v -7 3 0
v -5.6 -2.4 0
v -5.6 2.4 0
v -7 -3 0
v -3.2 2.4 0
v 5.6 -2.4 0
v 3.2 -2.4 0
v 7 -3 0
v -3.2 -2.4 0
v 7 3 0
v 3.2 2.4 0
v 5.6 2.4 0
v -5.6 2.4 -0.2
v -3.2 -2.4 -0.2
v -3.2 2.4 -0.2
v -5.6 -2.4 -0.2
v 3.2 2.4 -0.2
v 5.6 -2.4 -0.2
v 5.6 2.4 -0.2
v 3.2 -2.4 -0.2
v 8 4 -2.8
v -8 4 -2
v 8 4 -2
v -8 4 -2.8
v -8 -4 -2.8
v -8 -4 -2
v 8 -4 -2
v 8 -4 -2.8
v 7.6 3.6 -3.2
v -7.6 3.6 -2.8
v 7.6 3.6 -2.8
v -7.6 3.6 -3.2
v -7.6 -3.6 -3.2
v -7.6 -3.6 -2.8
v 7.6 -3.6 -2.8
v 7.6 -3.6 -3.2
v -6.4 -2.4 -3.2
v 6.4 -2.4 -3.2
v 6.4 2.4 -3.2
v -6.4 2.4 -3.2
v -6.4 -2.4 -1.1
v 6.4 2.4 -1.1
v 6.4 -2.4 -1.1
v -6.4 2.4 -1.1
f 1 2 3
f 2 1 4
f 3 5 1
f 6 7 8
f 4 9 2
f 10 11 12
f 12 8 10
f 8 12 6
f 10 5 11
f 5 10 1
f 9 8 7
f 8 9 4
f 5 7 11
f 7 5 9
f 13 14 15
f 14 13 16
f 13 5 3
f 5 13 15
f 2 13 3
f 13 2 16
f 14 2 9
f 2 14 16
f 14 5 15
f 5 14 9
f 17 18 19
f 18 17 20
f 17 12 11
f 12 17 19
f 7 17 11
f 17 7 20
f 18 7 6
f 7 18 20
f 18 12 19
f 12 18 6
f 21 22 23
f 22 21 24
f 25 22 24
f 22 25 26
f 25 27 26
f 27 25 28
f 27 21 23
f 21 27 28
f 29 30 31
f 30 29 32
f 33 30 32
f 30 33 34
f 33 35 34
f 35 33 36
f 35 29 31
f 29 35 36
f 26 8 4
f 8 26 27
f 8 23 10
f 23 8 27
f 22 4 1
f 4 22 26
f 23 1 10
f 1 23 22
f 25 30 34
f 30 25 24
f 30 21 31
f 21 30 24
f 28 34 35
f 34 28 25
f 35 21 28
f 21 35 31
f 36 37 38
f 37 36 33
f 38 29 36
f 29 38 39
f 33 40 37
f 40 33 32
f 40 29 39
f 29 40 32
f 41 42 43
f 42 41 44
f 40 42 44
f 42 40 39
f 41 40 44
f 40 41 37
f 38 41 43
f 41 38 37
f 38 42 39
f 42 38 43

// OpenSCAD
// file: ../p/4-4edge.scad
use <../lib.scad>
$fa=1; $fs=0.2;
function ldraw_lib__4_4edge(realsolid=false) = [
// 0 Circle 1.0
// 0 Name: 4-4edge.dat
// 0 Author: James Jessiman
// 0 !LDRAW_ORG Primitive UPDATE 2017-01
// 0 !LICENSE Licensed under CC BY 2.0 and CC BY 4.0 : see CAreadme.txt
// 
// 0 BFC CERTIFY CCW
  [0,"BFC","CERTIFY"],
  [0,"BFC","CCW"],
// 
// 0 !HISTORY 1998-12-15 [PTadmin] Official Update 1998-10
// 0 !HISTORY 2005-12-28 [PTadmin] Official Update 2005-01
// 0 !HISTORY 2007-06-24 [PTadmin] Header formatted for Contributor Agreement
// 0 !HISTORY 2008-07-01 [PTadmin] Official Update 2008-01
// 0 !HISTORY 2017-01-15 [Steffen] BFCed
// 0 !HISTORY 2017-12-30 [PTadmin] Official Update 2017-01
// 
// 
// 2 24 1 0 0 0.9239 0 0.3827
  [2,24,1,0,0,0.9239,0,0.3827],
// 2 24 0.9239 0 0.3827 0.7071 0 0.7071
  [2,24,0.9239,0,0.3827,0.7071,0,0.7071],
// 2 24 0.7071 0 0.7071 0.3827 0 0.9239
  [2,24,0.7071,0,0.7071,0.3827,0,0.9239],
// 2 24 0.3827 0 0.9239 0 0 1
  [2,24,0.3827,0,0.9239,0,0,1],
// 2 24 0 0 1 -0.3827 0 0.9239
  [2,24,0,0,1,-0.3827,0,0.9239],
// 2 24 -0.3827 0 0.9239 -0.7071 0 0.7071
  [2,24,-0.3827,0,0.9239,-0.7071,0,0.7071],
// 2 24 -0.7071 0 0.7071 -0.9239 0 0.3827
  [2,24,-0.7071,0,0.7071,-0.9239,0,0.3827],
// 2 24 -0.9239 0 0.3827 -1 0 -0
  [2,24,-0.9239,0,0.3827,-1,0,-0],
// 2 24 -1 0 -0 -0.9239 0 -0.3827
  [2,24,-1,0,-0,-0.9239,0,-0.3827],
// 2 24 -0.9239 0 -0.3827 -0.7071 0 -0.7071
  [2,24,-0.9239,0,-0.3827,-0.7071,0,-0.7071],
// 2 24 -0.7071 0 -0.7071 -0.3827 0 -0.9239
  [2,24,-0.7071,0,-0.7071,-0.3827,0,-0.9239],
// 2 24 -0.3827 0 -0.9239 0 0 -1
  [2,24,-0.3827,0,-0.9239,0,0,-1],
// 2 24 0 0 -1 0.3827 0 -0.9239
  [2,24,0,0,-1,0.3827,0,-0.9239],
// 2 24 0.3827 0 -0.9239 0.7071 0 -0.7071
  [2,24,0.3827,0,-0.9239,0.7071,0,-0.7071],
// 2 24 0.7071 0 -0.7071 0.9239 0 -0.3827
  [2,24,0.7071,0,-0.7071,0.9239,0,-0.3827],
// 2 24 0.9239 0 -0.3827 1 0 0
  [2,24,0.9239,0,-0.3827,1,0,0],
];
module ldraw_lib__4_4edge(step=0, col=false, unit=2/5, alt=false, line=0.2, solid=!$preview)
    makepoly(ldraw_lib__4_4edge(solid), step=step, col=col, unit=unit, alt=alt, line=line, solid=solid);
ldraw_lib__4_4edge(line=0.2);
// file: ../p/4-4disc.scad
use <../lib.scad>
$fa=1; $fs=0.2;
function ldraw_lib__4_4disc(realsolid=false) = [
// 0 Disc 1.0
// 0 Name: 4-4disc.dat
// 0 Author: James Jessiman
// 0 !LDRAW_ORG Primitive UPDATE 2002-02
// 0 !LICENSE Licensed under CC BY 2.0 and CC BY 4.0 : see CAreadme.txt
// 
// 0 BFC CERTIFY CCW
  [0,"BFC","CERTIFY"],
  [0,"BFC","CCW"],
// 
// 0 !HISTORY 1998-12-15 [PTadmin] Official Update 1998-10
// 0 !HISTORY 2002-03-23 [sbliss] Added BFC statement
// 0 !HISTORY 2002-04-25 [PTadmin] Official Update 2002-02
// 0 !HISTORY 2007-06-24 [PTadmin] Header formatted for Contributor Agreement
// 0 !HISTORY 2008-07-01 [PTadmin] Official Update 2008-01
// 
// 
// 3 16 0 0 0 1 0 0 0.9239 0 0.3827
  [3,16,0,0,0,1,0,0,0.9239,0,0.3827],
// 3 16 0 0 0 0.9239 0 0.3827 0.7071 0 0.7071
  [3,16,0,0,0,0.9239,0,0.3827,0.7071,0,0.7071],
// 3 16 0 0 0 0.7071 0 0.7071 0.3827 0 0.9239
  [3,16,0,0,0,0.7071,0,0.7071,0.3827,0,0.9239],
// 3 16 0 0 0 0.3827 0 0.9239 0 0 1
  [3,16,0,0,0,0.3827,0,0.9239,0,0,1],
// 3 16 0 0 0 0 0 1 -0.3827 0 0.9239
  [3,16,0,0,0,0,0,1,-0.3827,0,0.9239],
// 3 16 0 0 0 -0.3827 0 0.9239 -0.7071 0 0.7071
  [3,16,0,0,0,-0.3827,0,0.9239,-0.7071,0,0.7071],
// 3 16 0 0 0 -0.7071 0 0.7071 -0.9239 0 0.3827
  [3,16,0,0,0,-0.7071,0,0.7071,-0.9239,0,0.3827],
// 3 16 0 0 0 -0.9239 0 0.3827 -1 0 -0
  [3,16,0,0,0,-0.9239,0,0.3827,-1,0,-0],
// 3 16 0 0 0 -1 0 -0 -0.9239 0 -0.3827
  [3,16,0,0,0,-1,0,-0,-0.9239,0,-0.3827],
// 3 16 0 0 0 -0.9239 0 -0.3827 -0.7071 0 -0.7071
  [3,16,0,0,0,-0.9239,0,-0.3827,-0.7071,0,-0.7071],
// 3 16 0 0 0 -0.7071 0 -0.7071 -0.3827 0 -0.9239
  [3,16,0,0,0,-0.7071,0,-0.7071,-0.3827,0,-0.9239],
// 3 16 0 0 0 -0.3827 0 -0.9239 0 0 -1
  [3,16,0,0,0,-0.3827,0,-0.9239,0,0,-1],
// 3 16 0 0 0 0 0 -1 0.3827 0 -0.9239
  [3,16,0,0,0,0,0,-1,0.3827,0,-0.9239],
// 3 16 0 0 0 0.3827 0 -0.9239 0.7071 0 -0.7071
  [3,16,0,0,0,0.3827,0,-0.9239,0.7071,0,-0.7071],
// 3 16 0 0 0 0.7071 0 -0.7071 0.9239 0 -0.3827
  [3,16,0,0,0,0.7071,0,-0.7071,0.9239,0,-0.3827],
// 3 16 0 0 0 0.9239 0 -0.3827 1 0 0
  [3,16,0,0,0,0.9239,0,-0.3827,1,0,0],
// 0
];
module ldraw_lib__4_4disc(step=0, col=false, unit=2/5, alt=false, line=0.2, solid=!$preview)
    makepoly(ldraw_lib__4_4disc(solid), step=step, col=col, unit=unit, alt=alt, line=line, solid=solid);
ldraw_lib__4_4disc(line=0.2);
// file: ../p/4-4cyli.scad
use <../lib.scad>
$fa=1; $fs=0.2;
function ldraw_lib__4_4cyli(realsolid=false) = [
// 0 Cylinder 1.0
// 0 Name: 4-4cyli.dat
// 0 Author: James Jessiman
// 0 !LDRAW_ORG Primitive UPDATE 2005-01
// 0 !LICENSE Licensed under CC BY 2.0 and CC BY 4.0 : see CAreadme.txt
// 
// 0 BFC CERTIFY CCW
  [0,"BFC","CERTIFY"],
  [0,"BFC","CCW"],
// 
// 0 !HISTORY 1998-12-15 [PTadmin] Official Update 1998-10
// 0 !HISTORY 2002-03-23 [sbliss] Added BFC statement; merged headers from files in distributions LDraw 0.27 and Complete.
// 0 !HISTORY 2002-04-25 [PTadmin] Official Update 2002-02
// 0 !HISTORY 2004-12-14 [guyvivan] BFC CCW
// 0 !HISTORY 2005-12-28 [PTadmin] Official Update 2005-01
// 0 !HISTORY 2007-06-24 [PTadmin] Header formatted for Contributor Agreement
// 0 !HISTORY 2008-07-01 [PTadmin] Official Update 2008-01
// 
// 
// 4 16 1 1 0 0.9239 1 0.3827 0.9239 0 0.3827 1 0 0
  [4,16,1,1,0,0.9239,1,0.3827,0.9239,0,0.3827,1,0,0],
// 5 24 1 0 0 1 1 0 0.9239 0 0.3827 0.9239 0 -0.3827
  [5,24,1,0,0,1,1,0,0.9239,0,0.3827,0.9239,0,-0.3827],
// 4 16 0.9239 1 0.3827 0.7071 1 0.7071 0.7071 0 0.7071 0.9239 0 0.3827
  [4,16,0.9239,1,0.3827,0.7071,1,0.7071,0.7071,0,0.7071,0.9239,0,0.3827],
// 5 24 0.9239 0 0.3827 0.9239 1 0.3827 0.7071 0 0.7071 1 0 0
  [5,24,0.9239,0,0.3827,0.9239,1,0.3827,0.7071,0,0.7071,1,0,0],
// 4 16 0.7071 1 0.7071 0.3827 1 0.9239 0.3827 0 0.9239 0.7071 0 0.7071
  [4,16,0.7071,1,0.7071,0.3827,1,0.9239,0.3827,0,0.9239,0.7071,0,0.7071],
// 5 24 0.7071 0 0.7071 0.7071 1 0.7071 0.3827 0 0.9239 0.9239 0 0.3827
  [5,24,0.7071,0,0.7071,0.7071,1,0.7071,0.3827,0,0.9239,0.9239,0,0.3827],
// 4 16 0.3827 1 0.9239 0 1 1 0 0 1 0.3827 0 0.9239
  [4,16,0.3827,1,0.9239,0,1,1,0,0,1,0.3827,0,0.9239],
// 5 24 0.3827 0 0.9239 0.3827 1 0.9239 0 0 1 0.7071 0 0.7071
  [5,24,0.3827,0,0.9239,0.3827,1,0.9239,0,0,1,0.7071,0,0.7071],
// 4 16 0 1 1 -0.3827 1 0.9239 -0.3827 0 0.9239 0 0 1
  [4,16,0,1,1,-0.3827,1,0.9239,-0.3827,0,0.9239,0,0,1],
// 5 24 0 0 1 0 1 1 -0.3827 0 0.9239 0.3827 0 0.9239
  [5,24,0,0,1,0,1,1,-0.3827,0,0.9239,0.3827,0,0.9239],
// 4 16 -0.3827 1 0.9239 -0.7071 1 0.7071 -0.7071 0 0.7071 -0.3827 0 0.9239
  [4,16,-0.3827,1,0.9239,-0.7071,1,0.7071,-0.7071,0,0.7071,-0.3827,0,0.9239],
// 5 24 -0.3827 0 0.9239 -0.3827 1 0.9239 -0.7071 0 0.7071 0 0 1
  [5,24,-0.3827,0,0.9239,-0.3827,1,0.9239,-0.7071,0,0.7071,0,0,1],
// 4 16 -0.7071 1 0.7071 -0.9239 1 0.3827 -0.9239 0 0.3827 -0.7071 0 0.7071
  [4,16,-0.7071,1,0.7071,-0.9239,1,0.3827,-0.9239,0,0.3827,-0.7071,0,0.7071],
// 5 24 -0.7071 0 0.7071 -0.7071 1 0.7071 -0.9239 0 0.3827 -0.3827 0 0.9239
  [5,24,-0.7071,0,0.7071,-0.7071,1,0.7071,-0.9239,0,0.3827,-0.3827,0,0.9239],
// 4 16 -0.9239 1 0.3827 -1 1 0 -1 0 0 -0.9239 0 0.3827
  [4,16,-0.9239,1,0.3827,-1,1,0,-1,0,0,-0.9239,0,0.3827],
// 5 24 -0.9239 0 0.3827 -0.9239 1 0.3827 -1 0 0 -0.7071 0 0.7071
  [5,24,-0.9239,0,0.3827,-0.9239,1,0.3827,-1,0,0,-0.7071,0,0.7071],
// 4 16 -1 1 0 -0.9239 1 -0.3827 -0.9239 0 -0.3827 -1 0 0
  [4,16,-1,1,0,-0.9239,1,-0.3827,-0.9239,0,-0.3827,-1,0,0],
// 5 24 -1 0 0 -1 1 0 -0.9239 0 -0.3827 -0.9239 0 0.3827
  [5,24,-1,0,0,-1,1,0,-0.9239,0,-0.3827,-0.9239,0,0.3827],
// 4 16 -0.9239 1 -0.3827 -0.7071 1 -0.7071 -0.7071 0 -0.7071 -0.9239 0 -0.3827
  [4,16,-0.9239,1,-0.3827,-0.7071,1,-0.7071,-0.7071,0,-0.7071,-0.9239,0,-0.3827],
// 5 24 -0.9239 0 -0.3827 -0.9239 1 -0.3827 -0.7071 0 -0.7071 -1 0 0
  [5,24,-0.9239,0,-0.3827,-0.9239,1,-0.3827,-0.7071,0,-0.7071,-1,0,0],
// 4 16 -0.7071 1 -0.7071 -0.3827 1 -0.9239 -0.3827 0 -0.9239 -0.7071 0 -0.7071
  [4,16,-0.7071,1,-0.7071,-0.3827,1,-0.9239,-0.3827,0,-0.9239,-0.7071,0,-0.7071],
// 5 24 -0.7071 0 -0.7071 -0.7071 1 -0.7071 -0.3827 0 -0.9239 -0.9239 0 -0.3827
  [5,24,-0.7071,0,-0.7071,-0.7071,1,-0.7071,-0.3827,0,-0.9239,-0.9239,0,-0.3827],
// 4 16 -0.3827 1 -0.9239 0 1 -1 0 0 -1 -0.3827 0 -0.9239
  [4,16,-0.3827,1,-0.9239,0,1,-1,0,0,-1,-0.3827,0,-0.9239],
// 5 24 -0.3827 0 -0.9239 -0.3827 1 -0.9239 0 0 -1 -0.7071 0 -0.7071
  [5,24,-0.3827,0,-0.9239,-0.3827,1,-0.9239,0,0,-1,-0.7071,0,-0.7071],
// 4 16 0 1 -1 0.3827 1 -0.9239 0.3827 0 -0.9239 0 0 -1
  [4,16,0,1,-1,0.3827,1,-0.9239,0.3827,0,-0.9239,0,0,-1],
// 5 24 0 0 -1 0 1 -1 0.3827 0 -0.9239 -0.3827 0 -0.9239
  [5,24,0,0,-1,0,1,-1,0.3827,0,-0.9239,-0.3827,0,-0.9239],
// 4 16 0.3827 1 -0.9239 0.7071 1 -0.7071 0.7071 0 -0.7071 0.3827 0 -0.9239
  [4,16,0.3827,1,-0.9239,0.7071,1,-0.7071,0.7071,0,-0.7071,0.3827,0,-0.9239],
// 5 24 0.3827 0 -0.9239 0.3827 1 -0.9239 0.7071 0 -0.7071 0 0 -1
  [5,24,0.3827,0,-0.9239,0.3827,1,-0.9239,0.7071,0,-0.7071,0,0,-1],
// 4 16 0.7071 1 -0.7071 0.9239 1 -0.3827 0.9239 0 -0.3827 0.7071 0 -0.7071
  [4,16,0.7071,1,-0.7071,0.9239,1,-0.3827,0.9239,0,-0.3827,0.7071,0,-0.7071],
// 5 24 0.7071 0 -0.7071 0.7071 1 -0.7071 0.9239 0 -0.3827 0.3827 0 -0.9239
  [5,24,0.7071,0,-0.7071,0.7071,1,-0.7071,0.9239,0,-0.3827,0.3827,0,-0.9239],
// 4 16 0.9239 1 -0.3827 1 1 0 1 0 0 0.9239 0 -0.3827
  [4,16,0.9239,1,-0.3827,1,1,0,1,0,0,0.9239,0,-0.3827],
// 5 24 0.9239 0 -0.3827 0.9239 1 -0.3827 1 0 0 0.7071 0 -0.7071
  [5,24,0.9239,0,-0.3827,0.9239,1,-0.3827,1,0,0,0.7071,0,-0.7071],
// 0
];
module ldraw_lib__4_4cyli(step=0, col=false, unit=2/5, alt=false, line=0.2, solid=!$preview)
    makepoly(ldraw_lib__4_4cyli(solid), step=step, col=col, unit=unit, alt=alt, line=line, solid=solid);
ldraw_lib__4_4cyli(line=0.2);
// file: ../p/stud3.scad
use <../lib.scad>
use <4-4cyli.scad>
use <4-4disc.scad>
use <4-4edge.scad>
$fa=1; $fs=0.2;
function ldraw_lib__stud3(realsolid=false) = realsolid ? 
    [openscad(translate([0,0,-eps()], o=cylinder(4+eps(), r=4)),2)] : [
// 0 Stud Tube Solid
// 0 Name: stud3.dat
// 0 Author: James Jessiman
// 0 !LDRAW_ORG Primitive UPDATE 2012-01
// 0 !LICENSE Licensed under CC BY 2.0 and CC BY 4.0 : see CAreadme.txt
// 
// 0 BFC CERTIFY CCW
  [0,"BFC","CERTIFY"],
  [0,"BFC","CCW"],
// 
// 0 !HISTORY 2002-04-04 [sbliss] Modified for BFC compliance
// 0 !HISTORY 2002-04-25 [PTadmin] Official Update 2002-02
// 0 !HISTORY 2007-06-24 [PTadmin] Header formatted for Contributor Agreement
// 0 !HISTORY 2008-07-01 [PTadmin] Official Update 2008-01
// 0 !HISTORY 2012-02-16 [Philo] Changed to CCW
// 0 !HISTORY 2012-03-30 [PTadmin] Official Update 2012-01
// 
// 
// 1 16 0 -4 0 4 0 0 0 1 0 0 0 4 4-4edge.dat
  [1,16,0,-4,0,4,0,0,0,1,0,0,0,4, ldraw_lib__4_4edge(realsolid)],
// 1 16 0 0 0 4 0 0 0 1 0 0 0 4 4-4edge.dat
  [1,16,0,0,0,4,0,0,0,1,0,0,0,4, ldraw_lib__4_4edge(realsolid)],
// 1 16 0 -4 0 4 0 0 0 1 0 0 0 4 4-4disc.dat
  [1,16,0,-4,0,4,0,0,0,1,0,0,0,4, ldraw_lib__4_4disc(realsolid)],
// 1 16 0 -4 0 4 0 0 0 4 0 0 0 4 4-4cyli.dat
  [1,16,0,-4,0,4,0,0,0,4,0,0,0,4, ldraw_lib__4_4cyli(realsolid)],
];
module ldraw_lib__stud3(step=0, col=false, unit=2/5, alt=false, line=0.2, solid=!$preview)
    makepoly(ldraw_lib__stud3(solid), step=step, col=col, unit=unit, alt=alt, line=line, solid=solid);
ldraw_lib__stud3(line=0.2);
// file: ../p/stud.scad
use <../lib.scad>
use <4-4cyli.scad>
use <4-4disc.scad>
use <4-4edge.scad>
$fa=1; $fs=0.2;
function ldraw_lib__stud(realsolid=false) = realsolid ? 
    [openscad(translate([0,0,-eps()], o=cylinder(4+eps(), r=6)),2)] : [
// 0 Stud
// 0 Name: stud.dat
// 0 Author: James Jessiman
// 0 !LDRAW_ORG Primitive UPDATE 2012-01
// 0 !LICENSE Licensed under CC BY 2.0 and CC BY 4.0 : see CAreadme.txt
// 
// 0 BFC CERTIFY CCW
  [0,"BFC","CERTIFY"],
  [0,"BFC","CCW"],
// 
// 0 !HISTORY 2002-04-04 [sbliss] Modified for BFC compliance
// 0 !HISTORY 2002-04-25 [PTadmin] Official Update 2002-02
// 0 !HISTORY 2007-06-24 [PTadmin] Header formatted for Contributor Agreement
// 0 !HISTORY 2008-07-01 [PTadmin] Official Update 2008-01
// 0 !HISTORY 2012-02-16 [Philo] Changed to CCW
// 0 !HISTORY 2012-03-30 [PTadmin] Official Update 2012-01
// 
// 
// 1 16 0 0 0 6 0 0 0 1 0 0 0 6 4-4edge.dat
  [1,16,0,0,0,6,0,0,0,1,0,0,0,6, ldraw_lib__4_4edge(realsolid)],
// 1 16 0 -4 0 6 0 0 0 1 0 0 0 6 4-4edge.dat
  [1,16,0,-4,0,6,0,0,0,1,0,0,0,6, ldraw_lib__4_4edge(realsolid)],
// 1 16 0 0 0 6 0 0 0 -4 0 0 0 6 4-4cyli.dat
  [1,16,0,0,0,6,0,0,0,-4,0,0,0,6, ldraw_lib__4_4cyli(realsolid)],
// 1 16 0 -4 0 6 0 0 0 1 0 0 0 6 4-4disc.dat
  [1,16,0,-4,0,6,0,0,0,1,0,0,0,6, ldraw_lib__4_4disc(realsolid)],
];
module ldraw_lib__stud(step=0, col=false, unit=2/5, alt=false, line=0.2, solid=!$preview)
    makepoly(ldraw_lib__stud(solid), step=step, col=col, unit=unit, alt=alt, line=line, solid=solid);
ldraw_lib__stud(line=0.2);
// file: ../p/box4t.scad
use <../lib.scad>
$fa=1; $fs=0.2;
function ldraw_lib__box4t(realsolid=false) = [
// 0 Box with 4 Adjacent Faces and All Edges
// 0 Name: box4t.dat
// 0 Author: Tore Eriksson [Tore_Eriksson]
// 0 !LDRAW_ORG Primitive UPDATE 2003-02
// 0 !LICENSE Licensed under CC BY 2.0 and CC BY 4.0 : see CAreadme.txt
// 
// 0 BFC CERTIFY CCW
  [0,"BFC","CERTIFY"],
  [0,"BFC","CCW"],
// 
// 0 !HISTORY 1997-09-29 [PTadmin] Official Update 1997-15
// 0 !HISTORY 2002-08-31 [izanette] Modified with WINDZ for BFC compliance
// 0 !HISTORY 2003-08-01 [PTadmin] Official Update 2003-02
// 0 !HISTORY 2007-06-24 [PTadmin] Header formatted for Contributor Agreement
// 0 !HISTORY 2008-07-01 [PTadmin] Official Update 2008-01
// 
// 
// 2 24 1 1 1 -1 1 1
  [2,24,1,1,1,-1,1,1],
// 2 24 -1 1 1 -1 1 -1
  [2,24,-1,1,1,-1,1,-1],
// 2 24 -1 1 -1 1 1 -1
  [2,24,-1,1,-1,1,1,-1],
// 2 24 1 1 -1 1 1 1
  [2,24,1,1,-1,1,1,1],
// 2 24 1 0 1 -1 0 1
  [2,24,1,0,1,-1,0,1],
// 2 24 -1 0 1 -1 0 -1
  [2,24,-1,0,1,-1,0,-1],
// 2 24 -1 0 -1 1 0 -1
  [2,24,-1,0,-1,1,0,-1],
// 2 24 1 0 -1 1 0 1
  [2,24,1,0,-1,1,0,1],
// 2 24 1 0 1 1 1 1
  [2,24,1,0,1,1,1,1],
// 2 24 -1 0 1 -1 1 1
  [2,24,-1,0,1,-1,1,1],
// 2 24 1 0 -1 1 1 -1
  [2,24,1,0,-1,1,1,-1],
// 2 24 -1 0 -1 -1 1 -1
  [2,24,-1,0,-1,-1,1,-1],
// 4 16 1 1 1 1 1 -1 -1 1 -1 -1 1 1
  [4,16,1,1,1,1,1,-1,-1,1,-1,-1,1,1],
// 4 16 1 1 1 -1 1 1 -1 0 1 1 0 1
  [4,16,1,1,1,-1,1,1,-1,0,1,1,0,1],
// 4 16 -1 1 1 -1 1 -1 -1 0 -1 -1 0 1
  [4,16,-1,1,1,-1,1,-1,-1,0,-1,-1,0,1],
// 0 4 16 -1 1 -1 -1 0 -1 1 0 -1 1 1 -1
// 4 16 1 1 -1 1 1 1 1 0 1 1 0 -1
  [4,16,1,1,-1,1,1,1,1,0,1,1,0,-1],
// 0
];
module ldraw_lib__box4t(step=0, col=false, unit=2/5, alt=false, line=0.2, solid=!$preview)
    makepoly(ldraw_lib__box4t(solid), step=step, col=col, unit=unit, alt=alt, line=line, solid=solid);
ldraw_lib__box4t(line=0.2);
// file: s/3004s01.scad
use <../../lib.scad>
use <../../p/box4t.scad>
use <../../p/box5.scad>
use <../../p/stud.scad>
use <../../p/stud3.scad>
$fa=1; $fs=0.2;
function ldraw_lib__s__3004s01(realsolid=false) = [
// 0 ~Brick  1 x  2 without Front Face
// 0 Name: s\3004s01.dat
// 0 Author: James Jessiman
// 0 !LDRAW_ORG Subpart UPDATE 2003-03
// 0 !LICENSE Licensed under CC BY 2.0 and CC BY 4.0 : see CAreadme.txt
// 
// 0 BFC CERTIFY CCW
  [0,"BFC","CERTIFY"],
  [0,"BFC","CCW"],
// 
// 0 !HISTORY 2003-09-07 [jriley] Subfiling, BFC
// 0 !HISTORY 2003-12-19 [PTadmin] Official Update 2003-03
// 0 !HISTORY 2007-08-29 [PTadmin] Header formatted for Contributor Agreement
// 0 !HISTORY 2008-07-01 [PTadmin] Official Update 2008-01
// 
// 
// 1 16 0 4 0 1 0 0 0 -5 0 0 0 1 stud3.dat
  [1,16,0,4,0,1,0,0,0,-5,0,0,0,1, ldraw_lib__stud3(realsolid)],
// 0 BFC INVERTNEXT
  [0,"BFC","INVERTNEXT"],
// 1 16 0 24 0 16 0 0 0 -20 0 0 0 6 box5.dat
  [1,16,0,24,0,16,0,0,0,-20,0,0,0,6, ldraw_lib__box5(realsolid)],
// 4 16 20 24 10 16 24 6 -16 24 6 -20 24 10
  [4,16,20,24,10,16,24,6,-16,24,6,-20,24,10],
// 4 16 -20 24 10 -16 24 6 -16 24 -6 -20 24 -10
  [4,16,-20,24,10,-16,24,6,-16,24,-6,-20,24,-10],
// 4 16 -20 24 -10 -16 24 -6 16 24 -6 20 24 -10
  [4,16,-20,24,-10,-16,24,-6,16,24,-6,20,24,-10],
// 4 16 20 24 -10 16 24 -6 16 24 6 20 24 10
  [4,16,20,24,-10,16,24,-6,16,24,6,20,24,10],
// 1 16 0 24 0 20 0 0 0 -24 0 0 0 10 box4t.dat
  [1,16,0,24,0,20,0,0,0,-24,0,0,0,10, ldraw_lib__box4t(realsolid)],
// 1 16 10 0 0 1 0 0 0 1 0 0 0 1 stud.dat
  [1,16,10,0,0,1,0,0,0,1,0,0,0,1, ldraw_lib__stud(realsolid)],
// 1 16 -10 0 0 1 0 0 0 1 0 0 0 1 stud.dat
  [1,16,-10,0,0,1,0,0,0,1,0,0,0,1, ldraw_lib__stud(realsolid)],
// 0
];
module ldraw_lib__s__3004s01(step=0, col=false, unit=2/5, alt=false, line=0.2, solid=!$preview)
    makepoly(ldraw_lib__s__3004s01(solid), step=step, col=col, unit=unit, alt=alt, line=line, solid=solid);
ldraw_lib__s__3004s01(line=0.2);
// file: 3004.scad
use <../lib.scad>
use <s/3004s01.scad>
$fa=1; $fs=0.2;
function ldraw_lib__3004(realsolid=false) = [
// 0 Brick  1 x  2
// 0 Name: 3004.dat
// 0 Author: James Jessiman
// 0 !LDRAW_ORG Part UPDATE 2022-05
// 0 !LICENSE Licensed under CC BY 2.0 and CC BY 4.0 : see CAreadme.txt
// 
// 0 BFC CERTIFY CCW
  [0,"BFC","CERTIFY"],
  [0,"BFC","CCW"],
// 
// 0 !HISTORY 2001-10-26 [PTadmin] Official Update 2001-01
// 0 !HISTORY 2002-05-07 {unknown} BFC Certification
// 0 !HISTORY 2002-06-11 [PTadmin] Official Update 2002-03
// 0 !HISTORY 2007-05-07 [PTadmin] Header formatted for Contributor Agreement
// 0 !HISTORY 2008-07-01 [PTadmin] Official Update 2008-01
// 0 !HISTORY 2022-08-04 [MagFors] Using subfile
// 0 !HISTORY 2022-09-15 [PTadmin] Official Update 2022-05
// 
// 
// 1 16 0 0 0 1 0 0 0 1 0 0 0 1 s\3004s01.dat
  [1,16,0,0,0,1,0,0,0,1,0,0,0,1, ldraw_lib__s__3004s01(realsolid)],
// 4 16 -20 24 -10 20 24 -10 20 0 -10 -20 0 -10
  [4,16,-20,24,-10,20,24,-10,20,0,-10,-20,0,-10],
];
module ldraw_lib__3004(step=0, col=false, unit=2/5, alt=false, line=0.2, solid=!$preview)
    makepoly(ldraw_lib__3004(solid), step=step, col=col, unit=unit, alt=alt, line=line, solid=solid);
ldraw_lib__3004(line=0.2);
// file: ../p/box5.scad
use <../lib.scad>
$fa=1; $fs=0.2;
function ldraw_lib__box5(realsolid=false) = [
// 0 Box with 5 Faces and All Edges
// 0 Name: box5.dat
// 0 Author: James Jessiman
// 0 !LDRAW_ORG Primitive UPDATE 2012-01
// 0 !LICENSE Licensed under CC BY 2.0 and CC BY 4.0 : see CAreadme.txt
// 
// 0 BFC CERTIFY CCW
  [0,"BFC","CERTIFY"],
  [0,"BFC","CCW"],
// 
// 0 !HISTORY 2002-04-03 [sbliss] Modified for BFC compliance
// 0 !HISTORY 2002-04-25 [PTadmin] Official Update 2002-02
// 0 !HISTORY 2007-06-24 [PTadmin] Header formatted for Contributor Agreement
// 0 !HISTORY 2008-07-01 [PTadmin] Official Update 2008-01
// 0 !HISTORY 2012-02-16 [Philo] Changed to CCW
// 0 !HISTORY 2012-03-30 [PTadmin] Official Update 2012-01
// 
// 
// 2 24 1 1 1 -1 1 1
  [2,24,1,1,1,-1,1,1],
// 2 24 -1 1 1 -1 1 -1
  [2,24,-1,1,1,-1,1,-1],
// 2 24 -1 1 -1 1 1 -1
  [2,24,-1,1,-1,1,1,-1],
// 2 24 1 1 -1 1 1 1
  [2,24,1,1,-1,1,1,1],
// 2 24 1 0 1 -1 0 1
  [2,24,1,0,1,-1,0,1],
// 2 24 -1 0 1 -1 0 -1
  [2,24,-1,0,1,-1,0,-1],
// 2 24 -1 0 -1 1 0 -1
  [2,24,-1,0,-1,1,0,-1],
// 2 24 1 0 -1 1 0 1
  [2,24,1,0,-1,1,0,1],
// 2 24 1 0 1 1 1 1
  [2,24,1,0,1,1,1,1],
// 2 24 -1 0 1 -1 1 1
  [2,24,-1,0,1,-1,1,1],
// 2 24 1 0 -1 1 1 -1
  [2,24,1,0,-1,1,1,-1],
// 2 24 -1 0 -1 -1 1 -1
  [2,24,-1,0,-1,-1,1,-1],
// 4 16 -1 1 1 1 1 1 1 1 -1 -1 1 -1
  [4,16,-1,1,1,1,1,1,1,1,-1,-1,1,-1],
// 4 16 -1 1 1 -1 0 1 1 0 1 1 1 1
  [4,16,-1,1,1,-1,0,1,1,0,1,1,1,1],
// 4 16 -1 1 -1 -1 0 -1 -1 0 1 -1 1 1
  [4,16,-1,1,-1,-1,0,-1,-1,0,1,-1,1,1],
// 4 16 1 1 -1 1 0 -1 -1 0 -1 -1 1 -1
  [4,16,1,1,-1,1,0,-1,-1,0,-1,-1,1,-1],
// 4 16 1 1 1 1 0 1 1 0 -1 1 1 -1
  [4,16,1,1,1,1,0,1,1,0,-1,1,1,-1],
];
module ldraw_lib__box5(step=0, col=false, unit=2/5, alt=false, line=0.2, solid=!$preview)
    makepoly(ldraw_lib__box5(solid), step=step, col=col, unit=unit, alt=alt, line=line, solid=solid);
ldraw_lib__box5(line=0.2);
// file: ../p/box4.scad
use <../lib.scad>
$fa=1; $fs=0.2;
function ldraw_lib__box4(realsolid=false) = [
// 0 Box with 4 Faces (2 Parallel Pairs) and All Edges
// 0 Name: box4.dat
// 0 Author: James Jessiman
// 0 !LDRAW_ORG Primitive UPDATE 2012-01
// 0 !LICENSE Licensed under CC BY 2.0 and CC BY 4.0 : see CAreadme.txt
// 
// 0 BFC CERTIFY CCW
  [0,"BFC","CERTIFY"],
  [0,"BFC","CCW"],
// 
// 0 !HISTORY 2002-04-03 [sbliss] Modified for BFC compliance
// 0 !HISTORY 2002-04-25 [PTadmin] Official Update 2002-02
// 0 !HISTORY 2007-06-24 [PTadmin] Header formatted for Contributor Agreement
// 0 !HISTORY 2008-07-01 [PTadmin] Official Update 2008-01
// 0 !HISTORY 2012-02-16 [Philo] Changed to CCW
// 0 !HISTORY 2012-03-30 [PTadmin] Official Update 2012-01
// 
// 
// 2 24 1 1 1 -1 1 1
  [2,24,1,1,1,-1,1,1],
// 2 24 -1 1 1 -1 1 -1
  [2,24,-1,1,1,-1,1,-1],
// 2 24 -1 1 -1 1 1 -1
  [2,24,-1,1,-1,1,1,-1],
// 2 24 1 1 -1 1 1 1
  [2,24,1,1,-1,1,1,1],
// 2 24 1 0 1 -1 0 1
  [2,24,1,0,1,-1,0,1],
// 2 24 -1 0 1 -1 0 -1
  [2,24,-1,0,1,-1,0,-1],
// 2 24 -1 0 -1 1 0 -1
  [2,24,-1,0,-1,1,0,-1],
// 2 24 1 0 -1 1 0 1
  [2,24,1,0,-1,1,0,1],
// 2 24 1 0 1 1 1 1
  [2,24,1,0,1,1,1,1],
// 2 24 -1 0 1 -1 1 1
  [2,24,-1,0,1,-1,1,1],
// 2 24 1 0 -1 1 1 -1
  [2,24,1,0,-1,1,1,-1],
// 2 24 -1 0 -1 -1 1 -1
  [2,24,-1,0,-1,-1,1,-1],
// 4 16 -1 1 1 -1 0 1 1 0 1 1 1 1
  [4,16,-1,1,1,-1,0,1,1,0,1,1,1,1],
// 4 16 -1 1 -1 -1 0 -1 -1 0 1 -1 1 1
  [4,16,-1,1,-1,-1,0,-1,-1,0,1,-1,1,1],
// 4 16 1 1 -1 1 0 -1 -1 0 -1 -1 1 -1
  [4,16,1,1,-1,1,0,-1,-1,0,-1,-1,1,-1],
// 4 16 1 1 1 1 0 1 1 0 -1 1 1 -1
  [4,16,1,1,1,1,0,1,1,0,-1,1,1,-1],
];
module ldraw_lib__box4(step=0, col=false, unit=2/5, alt=false, line=0.2, solid=!$preview)
    makepoly(ldraw_lib__box4(solid), step=step, col=col, unit=unit, alt=alt, line=line, solid=solid);
ldraw_lib__box4(line=0.2);
// main file
use <../lib.scad>
use <../p/box4.scad>
use <../p/box5.scad>
$fa=1; $fs=0.2;
function ldraw_lib__96910(realsolid=false) = [
// 0 Tile  1 x  2 Chamfered with 2 Top Indentations
// 0 Name: 96910.dat
// 0 Author: Stan Isachenko [angmarec]
// 0 !LDRAW_ORG Part UPDATE 2019-01
// 0 !LICENSE Licensed under CC BY 2.0 and CC BY 4.0 : see CAreadme.txt
// 
// 0 BFC CERTIFY CCW
  [0,"BFC","CERTIFY"],
  [0,"BFC","CCW"],
// 
// 0 !KEYWORDS bullion, Fort Knox, gold bar, Gold Ingot, Pirates of the Caribbean
// 0 !KEYWORDS treasure
// 
// 0 !CMDLINE -c334
// 
// 0 !HISTORY 2012-01-18 {LEGO Digital Designer} Original part shape
// 0 !HISTORY 2012-01-19 [angmarec] File preparation for LDraw Parts Tracker
// 0 !HISTORY 2012-04-22 [Steffen] added top dents, removed condlines, changed bottom groove, changed origin
// 0 !HISTORY 2012-12-28 [PTadmin] Official Update 2012-03
// 0 !HISTORY 2018-12-29 [cwdee] Retitled
// 0 !HISTORY 2019-06-28 [PTadmin] Official Update 2019-01
// 
// 
// 4 16 -17.5 0 -7.5 -14 0 -6 -14 0 6 -17.5 0 7.5
  [4,16,-17.5,0,-7.5,-14,0,-6,-14,0,6,-17.5,0,7.5],
// 3 16 -14 0 6 -8 0 6 -17.5 0 7.5
  [3,16,-14,0,6,-8,0,6,-17.5,0,7.5],
// 3 16 14 0 -6 8 0 -6 17.5 0 -7.5
  [3,16,14,0,-6,8,0,-6,17.5,0,-7.5],
// 3 16 -17.5 0 -7.5 -8 0 -6 -14 0 -6
  [3,16,-17.5,0,-7.5,-8,0,-6,-14,0,-6],
// 3 16 17.5 0 7.5 8 0 6 14 0 6
  [3,16,17.5,0,7.5,8,0,6,14,0,6],
// 4 16 17.5 0 7.5 14 0 6 14 0 -6 17.5 0 -7.5
  [4,16,17.5,0,7.5,14,0,6,14,0,-6,17.5,0,-7.5],
// 4 16 -17.5 0 7.5 -8 0 6 8 0 6 17.5 0 7.5
  [4,16,-17.5,0,7.5,-8,0,6,8,0,6,17.5,0,7.5],
// 4 16 17.5 0 -7.5 8 0 -6 -8 0 -6 -17.5 0 -7.5
  [4,16,17.5,0,-7.5,8,0,-6,-8,0,-6,-17.5,0,-7.5],
// 4 16 -8 0 6 -8 0 -6 8 0 -6 8 0 6
  [4,16,-8,0,6,-8,0,-6,8,0,-6,8,0,6],
// 0 BFC INVERTNEXT
  [0,"BFC","INVERTNEXT"],
// 1 16 -11 0 0 3 0 0 0 0.5 0 0 0 6 box5.dat
  [1,16,-11,0,0,3,0,0,0,0.5,0,0,0,6, ldraw_lib__box5(realsolid)],
// 0 BFC INVERTNEXT
  [0,"BFC","INVERTNEXT"],
// 1 16 11 0 0 3 0 0 0 0.5 0 0 0 6 box5.dat
  [1,16,11,0,0,3,0,0,0,0.5,0,0,0,6, ldraw_lib__box5(realsolid)],
// 1 16 0 5 0 20 0 0 0 2 0 0 0 10 box4.dat
  [1,16,0,5,0,20,0,0,0,2,0,0,0,10, ldraw_lib__box4(realsolid)],
// 1 16 0 7 0 19 0 0 0 1 0 0 0 9 box4.dat
  [1,16,0,7,0,19,0,0,0,1,0,0,0,9, ldraw_lib__box4(realsolid)],
// 4 16 -20 5 -10 20 5 -10 17.5 0 -7.5 -17.5 0 -7.5
  [4,16,-20,5,-10,20,5,-10,17.5,0,-7.5,-17.5,0,-7.5],
// 4 16 20 5 -10 20 5 10 17.5 0 7.5 17.5 0 -7.5
  [4,16,20,5,-10,20,5,10,17.5,0,7.5,17.5,0,-7.5],
// 4 16 -20 5 10 -20 5 -10 -17.5 0 -7.5 -17.5 0 7.5
  [4,16,-20,5,10,-20,5,-10,-17.5,0,-7.5,-17.5,0,7.5],
// 4 16 20 5 10 -20 5 10 -17.5 0 7.5 17.5 0 7.5
  [4,16,20,5,10,-20,5,10,-17.5,0,7.5,17.5,0,7.5],
// 4 16 -19 7 -9 -20 7 -10 -20 7 10 -19 7 9
  [4,16,-19,7,-9,-20,7,-10,-20,7,10,-19,7,9],
// 4 16 -19 7 9 -20 7 10 20 7 10 19 7 9
  [4,16,-19,7,9,-20,7,10,20,7,10,19,7,9],
// 4 16 19 7 -9 20 7 -10 -20 7 -10 -19 7 -9
  [4,16,19,7,-9,20,7,-10,-20,7,-10,-19,7,-9],
// 4 16 19 7 9 20 7 10 20 7 -10 19 7 -9
  [4,16,19,7,9,20,7,10,20,7,-10,19,7,-9],
// 4 16 16 8 -6 19 8 -9 -19 8 -9 -16 8 -6
  [4,16,16,8,-6,19,8,-9,-19,8,-9,-16,8,-6],
// 4 16 16 8 6 19 8 9 19 8 -9 16 8 -6
  [4,16,16,8,6,19,8,9,19,8,-9,16,8,-6],
// 4 16 -16 8 -6 -19 8 -9 -19 8 9 -16 8 6
  [4,16,-16,8,-6,-19,8,-9,-19,8,9,-16,8,6],
// 4 16 -16 8 6 -19 8 9 19 8 9 16 8 6
  [4,16,-16,8,6,-19,8,9,19,8,9,16,8,6],
// 2 24 -17.5 0 -7.5 17.5 0 -7.5
  [2,24,-17.5,0,-7.5,17.5,0,-7.5],
// 2 24 17.5 0 -7.5 17.5 0 7.5
  [2,24,17.5,0,-7.5,17.5,0,7.5],
// 2 24 20 5 -10 17.5 0 -7.5
  [2,24,20,5,-10,17.5,0,-7.5],
// 2 24 -17.5 0 -7.5 -20 5 -10
  [2,24,-17.5,0,-7.5,-20,5,-10],
// 2 24 20 5 10 17.5 0 7.5
  [2,24,20,5,10,17.5,0,7.5],
// 2 24 -17.5 0 7.5 -17.5 0 -7.5
  [2,24,-17.5,0,7.5,-17.5,0,-7.5],
// 2 24 17.5 0 7.5 -17.5 0 7.5
  [2,24,17.5,0,7.5,-17.5,0,7.5],
// 2 24 -17.5 0 7.5 -20 5 10
  [2,24,-17.5,0,7.5,-20,5,10],
// 0 BFC INVERTNEXT
  [0,"BFC","INVERTNEXT"],
// 1 16 0 8 0 16 0 0 0 -5.25 0 0 0 6 box5.dat
  [1,16,0,8,0,16,0,0,0,-5.25,0,0,0,6, ldraw_lib__box5(realsolid)],
];
module ldraw_lib__96910(step=0, col=false, unit=2/5, alt=false, line=0.2, solid=!$preview)
    makepoly(ldraw_lib__96910(solid), step=step, col=col, unit=unit, alt=alt, line=line, solid=solid);
ldraw_lib__96910(line=0.2);
